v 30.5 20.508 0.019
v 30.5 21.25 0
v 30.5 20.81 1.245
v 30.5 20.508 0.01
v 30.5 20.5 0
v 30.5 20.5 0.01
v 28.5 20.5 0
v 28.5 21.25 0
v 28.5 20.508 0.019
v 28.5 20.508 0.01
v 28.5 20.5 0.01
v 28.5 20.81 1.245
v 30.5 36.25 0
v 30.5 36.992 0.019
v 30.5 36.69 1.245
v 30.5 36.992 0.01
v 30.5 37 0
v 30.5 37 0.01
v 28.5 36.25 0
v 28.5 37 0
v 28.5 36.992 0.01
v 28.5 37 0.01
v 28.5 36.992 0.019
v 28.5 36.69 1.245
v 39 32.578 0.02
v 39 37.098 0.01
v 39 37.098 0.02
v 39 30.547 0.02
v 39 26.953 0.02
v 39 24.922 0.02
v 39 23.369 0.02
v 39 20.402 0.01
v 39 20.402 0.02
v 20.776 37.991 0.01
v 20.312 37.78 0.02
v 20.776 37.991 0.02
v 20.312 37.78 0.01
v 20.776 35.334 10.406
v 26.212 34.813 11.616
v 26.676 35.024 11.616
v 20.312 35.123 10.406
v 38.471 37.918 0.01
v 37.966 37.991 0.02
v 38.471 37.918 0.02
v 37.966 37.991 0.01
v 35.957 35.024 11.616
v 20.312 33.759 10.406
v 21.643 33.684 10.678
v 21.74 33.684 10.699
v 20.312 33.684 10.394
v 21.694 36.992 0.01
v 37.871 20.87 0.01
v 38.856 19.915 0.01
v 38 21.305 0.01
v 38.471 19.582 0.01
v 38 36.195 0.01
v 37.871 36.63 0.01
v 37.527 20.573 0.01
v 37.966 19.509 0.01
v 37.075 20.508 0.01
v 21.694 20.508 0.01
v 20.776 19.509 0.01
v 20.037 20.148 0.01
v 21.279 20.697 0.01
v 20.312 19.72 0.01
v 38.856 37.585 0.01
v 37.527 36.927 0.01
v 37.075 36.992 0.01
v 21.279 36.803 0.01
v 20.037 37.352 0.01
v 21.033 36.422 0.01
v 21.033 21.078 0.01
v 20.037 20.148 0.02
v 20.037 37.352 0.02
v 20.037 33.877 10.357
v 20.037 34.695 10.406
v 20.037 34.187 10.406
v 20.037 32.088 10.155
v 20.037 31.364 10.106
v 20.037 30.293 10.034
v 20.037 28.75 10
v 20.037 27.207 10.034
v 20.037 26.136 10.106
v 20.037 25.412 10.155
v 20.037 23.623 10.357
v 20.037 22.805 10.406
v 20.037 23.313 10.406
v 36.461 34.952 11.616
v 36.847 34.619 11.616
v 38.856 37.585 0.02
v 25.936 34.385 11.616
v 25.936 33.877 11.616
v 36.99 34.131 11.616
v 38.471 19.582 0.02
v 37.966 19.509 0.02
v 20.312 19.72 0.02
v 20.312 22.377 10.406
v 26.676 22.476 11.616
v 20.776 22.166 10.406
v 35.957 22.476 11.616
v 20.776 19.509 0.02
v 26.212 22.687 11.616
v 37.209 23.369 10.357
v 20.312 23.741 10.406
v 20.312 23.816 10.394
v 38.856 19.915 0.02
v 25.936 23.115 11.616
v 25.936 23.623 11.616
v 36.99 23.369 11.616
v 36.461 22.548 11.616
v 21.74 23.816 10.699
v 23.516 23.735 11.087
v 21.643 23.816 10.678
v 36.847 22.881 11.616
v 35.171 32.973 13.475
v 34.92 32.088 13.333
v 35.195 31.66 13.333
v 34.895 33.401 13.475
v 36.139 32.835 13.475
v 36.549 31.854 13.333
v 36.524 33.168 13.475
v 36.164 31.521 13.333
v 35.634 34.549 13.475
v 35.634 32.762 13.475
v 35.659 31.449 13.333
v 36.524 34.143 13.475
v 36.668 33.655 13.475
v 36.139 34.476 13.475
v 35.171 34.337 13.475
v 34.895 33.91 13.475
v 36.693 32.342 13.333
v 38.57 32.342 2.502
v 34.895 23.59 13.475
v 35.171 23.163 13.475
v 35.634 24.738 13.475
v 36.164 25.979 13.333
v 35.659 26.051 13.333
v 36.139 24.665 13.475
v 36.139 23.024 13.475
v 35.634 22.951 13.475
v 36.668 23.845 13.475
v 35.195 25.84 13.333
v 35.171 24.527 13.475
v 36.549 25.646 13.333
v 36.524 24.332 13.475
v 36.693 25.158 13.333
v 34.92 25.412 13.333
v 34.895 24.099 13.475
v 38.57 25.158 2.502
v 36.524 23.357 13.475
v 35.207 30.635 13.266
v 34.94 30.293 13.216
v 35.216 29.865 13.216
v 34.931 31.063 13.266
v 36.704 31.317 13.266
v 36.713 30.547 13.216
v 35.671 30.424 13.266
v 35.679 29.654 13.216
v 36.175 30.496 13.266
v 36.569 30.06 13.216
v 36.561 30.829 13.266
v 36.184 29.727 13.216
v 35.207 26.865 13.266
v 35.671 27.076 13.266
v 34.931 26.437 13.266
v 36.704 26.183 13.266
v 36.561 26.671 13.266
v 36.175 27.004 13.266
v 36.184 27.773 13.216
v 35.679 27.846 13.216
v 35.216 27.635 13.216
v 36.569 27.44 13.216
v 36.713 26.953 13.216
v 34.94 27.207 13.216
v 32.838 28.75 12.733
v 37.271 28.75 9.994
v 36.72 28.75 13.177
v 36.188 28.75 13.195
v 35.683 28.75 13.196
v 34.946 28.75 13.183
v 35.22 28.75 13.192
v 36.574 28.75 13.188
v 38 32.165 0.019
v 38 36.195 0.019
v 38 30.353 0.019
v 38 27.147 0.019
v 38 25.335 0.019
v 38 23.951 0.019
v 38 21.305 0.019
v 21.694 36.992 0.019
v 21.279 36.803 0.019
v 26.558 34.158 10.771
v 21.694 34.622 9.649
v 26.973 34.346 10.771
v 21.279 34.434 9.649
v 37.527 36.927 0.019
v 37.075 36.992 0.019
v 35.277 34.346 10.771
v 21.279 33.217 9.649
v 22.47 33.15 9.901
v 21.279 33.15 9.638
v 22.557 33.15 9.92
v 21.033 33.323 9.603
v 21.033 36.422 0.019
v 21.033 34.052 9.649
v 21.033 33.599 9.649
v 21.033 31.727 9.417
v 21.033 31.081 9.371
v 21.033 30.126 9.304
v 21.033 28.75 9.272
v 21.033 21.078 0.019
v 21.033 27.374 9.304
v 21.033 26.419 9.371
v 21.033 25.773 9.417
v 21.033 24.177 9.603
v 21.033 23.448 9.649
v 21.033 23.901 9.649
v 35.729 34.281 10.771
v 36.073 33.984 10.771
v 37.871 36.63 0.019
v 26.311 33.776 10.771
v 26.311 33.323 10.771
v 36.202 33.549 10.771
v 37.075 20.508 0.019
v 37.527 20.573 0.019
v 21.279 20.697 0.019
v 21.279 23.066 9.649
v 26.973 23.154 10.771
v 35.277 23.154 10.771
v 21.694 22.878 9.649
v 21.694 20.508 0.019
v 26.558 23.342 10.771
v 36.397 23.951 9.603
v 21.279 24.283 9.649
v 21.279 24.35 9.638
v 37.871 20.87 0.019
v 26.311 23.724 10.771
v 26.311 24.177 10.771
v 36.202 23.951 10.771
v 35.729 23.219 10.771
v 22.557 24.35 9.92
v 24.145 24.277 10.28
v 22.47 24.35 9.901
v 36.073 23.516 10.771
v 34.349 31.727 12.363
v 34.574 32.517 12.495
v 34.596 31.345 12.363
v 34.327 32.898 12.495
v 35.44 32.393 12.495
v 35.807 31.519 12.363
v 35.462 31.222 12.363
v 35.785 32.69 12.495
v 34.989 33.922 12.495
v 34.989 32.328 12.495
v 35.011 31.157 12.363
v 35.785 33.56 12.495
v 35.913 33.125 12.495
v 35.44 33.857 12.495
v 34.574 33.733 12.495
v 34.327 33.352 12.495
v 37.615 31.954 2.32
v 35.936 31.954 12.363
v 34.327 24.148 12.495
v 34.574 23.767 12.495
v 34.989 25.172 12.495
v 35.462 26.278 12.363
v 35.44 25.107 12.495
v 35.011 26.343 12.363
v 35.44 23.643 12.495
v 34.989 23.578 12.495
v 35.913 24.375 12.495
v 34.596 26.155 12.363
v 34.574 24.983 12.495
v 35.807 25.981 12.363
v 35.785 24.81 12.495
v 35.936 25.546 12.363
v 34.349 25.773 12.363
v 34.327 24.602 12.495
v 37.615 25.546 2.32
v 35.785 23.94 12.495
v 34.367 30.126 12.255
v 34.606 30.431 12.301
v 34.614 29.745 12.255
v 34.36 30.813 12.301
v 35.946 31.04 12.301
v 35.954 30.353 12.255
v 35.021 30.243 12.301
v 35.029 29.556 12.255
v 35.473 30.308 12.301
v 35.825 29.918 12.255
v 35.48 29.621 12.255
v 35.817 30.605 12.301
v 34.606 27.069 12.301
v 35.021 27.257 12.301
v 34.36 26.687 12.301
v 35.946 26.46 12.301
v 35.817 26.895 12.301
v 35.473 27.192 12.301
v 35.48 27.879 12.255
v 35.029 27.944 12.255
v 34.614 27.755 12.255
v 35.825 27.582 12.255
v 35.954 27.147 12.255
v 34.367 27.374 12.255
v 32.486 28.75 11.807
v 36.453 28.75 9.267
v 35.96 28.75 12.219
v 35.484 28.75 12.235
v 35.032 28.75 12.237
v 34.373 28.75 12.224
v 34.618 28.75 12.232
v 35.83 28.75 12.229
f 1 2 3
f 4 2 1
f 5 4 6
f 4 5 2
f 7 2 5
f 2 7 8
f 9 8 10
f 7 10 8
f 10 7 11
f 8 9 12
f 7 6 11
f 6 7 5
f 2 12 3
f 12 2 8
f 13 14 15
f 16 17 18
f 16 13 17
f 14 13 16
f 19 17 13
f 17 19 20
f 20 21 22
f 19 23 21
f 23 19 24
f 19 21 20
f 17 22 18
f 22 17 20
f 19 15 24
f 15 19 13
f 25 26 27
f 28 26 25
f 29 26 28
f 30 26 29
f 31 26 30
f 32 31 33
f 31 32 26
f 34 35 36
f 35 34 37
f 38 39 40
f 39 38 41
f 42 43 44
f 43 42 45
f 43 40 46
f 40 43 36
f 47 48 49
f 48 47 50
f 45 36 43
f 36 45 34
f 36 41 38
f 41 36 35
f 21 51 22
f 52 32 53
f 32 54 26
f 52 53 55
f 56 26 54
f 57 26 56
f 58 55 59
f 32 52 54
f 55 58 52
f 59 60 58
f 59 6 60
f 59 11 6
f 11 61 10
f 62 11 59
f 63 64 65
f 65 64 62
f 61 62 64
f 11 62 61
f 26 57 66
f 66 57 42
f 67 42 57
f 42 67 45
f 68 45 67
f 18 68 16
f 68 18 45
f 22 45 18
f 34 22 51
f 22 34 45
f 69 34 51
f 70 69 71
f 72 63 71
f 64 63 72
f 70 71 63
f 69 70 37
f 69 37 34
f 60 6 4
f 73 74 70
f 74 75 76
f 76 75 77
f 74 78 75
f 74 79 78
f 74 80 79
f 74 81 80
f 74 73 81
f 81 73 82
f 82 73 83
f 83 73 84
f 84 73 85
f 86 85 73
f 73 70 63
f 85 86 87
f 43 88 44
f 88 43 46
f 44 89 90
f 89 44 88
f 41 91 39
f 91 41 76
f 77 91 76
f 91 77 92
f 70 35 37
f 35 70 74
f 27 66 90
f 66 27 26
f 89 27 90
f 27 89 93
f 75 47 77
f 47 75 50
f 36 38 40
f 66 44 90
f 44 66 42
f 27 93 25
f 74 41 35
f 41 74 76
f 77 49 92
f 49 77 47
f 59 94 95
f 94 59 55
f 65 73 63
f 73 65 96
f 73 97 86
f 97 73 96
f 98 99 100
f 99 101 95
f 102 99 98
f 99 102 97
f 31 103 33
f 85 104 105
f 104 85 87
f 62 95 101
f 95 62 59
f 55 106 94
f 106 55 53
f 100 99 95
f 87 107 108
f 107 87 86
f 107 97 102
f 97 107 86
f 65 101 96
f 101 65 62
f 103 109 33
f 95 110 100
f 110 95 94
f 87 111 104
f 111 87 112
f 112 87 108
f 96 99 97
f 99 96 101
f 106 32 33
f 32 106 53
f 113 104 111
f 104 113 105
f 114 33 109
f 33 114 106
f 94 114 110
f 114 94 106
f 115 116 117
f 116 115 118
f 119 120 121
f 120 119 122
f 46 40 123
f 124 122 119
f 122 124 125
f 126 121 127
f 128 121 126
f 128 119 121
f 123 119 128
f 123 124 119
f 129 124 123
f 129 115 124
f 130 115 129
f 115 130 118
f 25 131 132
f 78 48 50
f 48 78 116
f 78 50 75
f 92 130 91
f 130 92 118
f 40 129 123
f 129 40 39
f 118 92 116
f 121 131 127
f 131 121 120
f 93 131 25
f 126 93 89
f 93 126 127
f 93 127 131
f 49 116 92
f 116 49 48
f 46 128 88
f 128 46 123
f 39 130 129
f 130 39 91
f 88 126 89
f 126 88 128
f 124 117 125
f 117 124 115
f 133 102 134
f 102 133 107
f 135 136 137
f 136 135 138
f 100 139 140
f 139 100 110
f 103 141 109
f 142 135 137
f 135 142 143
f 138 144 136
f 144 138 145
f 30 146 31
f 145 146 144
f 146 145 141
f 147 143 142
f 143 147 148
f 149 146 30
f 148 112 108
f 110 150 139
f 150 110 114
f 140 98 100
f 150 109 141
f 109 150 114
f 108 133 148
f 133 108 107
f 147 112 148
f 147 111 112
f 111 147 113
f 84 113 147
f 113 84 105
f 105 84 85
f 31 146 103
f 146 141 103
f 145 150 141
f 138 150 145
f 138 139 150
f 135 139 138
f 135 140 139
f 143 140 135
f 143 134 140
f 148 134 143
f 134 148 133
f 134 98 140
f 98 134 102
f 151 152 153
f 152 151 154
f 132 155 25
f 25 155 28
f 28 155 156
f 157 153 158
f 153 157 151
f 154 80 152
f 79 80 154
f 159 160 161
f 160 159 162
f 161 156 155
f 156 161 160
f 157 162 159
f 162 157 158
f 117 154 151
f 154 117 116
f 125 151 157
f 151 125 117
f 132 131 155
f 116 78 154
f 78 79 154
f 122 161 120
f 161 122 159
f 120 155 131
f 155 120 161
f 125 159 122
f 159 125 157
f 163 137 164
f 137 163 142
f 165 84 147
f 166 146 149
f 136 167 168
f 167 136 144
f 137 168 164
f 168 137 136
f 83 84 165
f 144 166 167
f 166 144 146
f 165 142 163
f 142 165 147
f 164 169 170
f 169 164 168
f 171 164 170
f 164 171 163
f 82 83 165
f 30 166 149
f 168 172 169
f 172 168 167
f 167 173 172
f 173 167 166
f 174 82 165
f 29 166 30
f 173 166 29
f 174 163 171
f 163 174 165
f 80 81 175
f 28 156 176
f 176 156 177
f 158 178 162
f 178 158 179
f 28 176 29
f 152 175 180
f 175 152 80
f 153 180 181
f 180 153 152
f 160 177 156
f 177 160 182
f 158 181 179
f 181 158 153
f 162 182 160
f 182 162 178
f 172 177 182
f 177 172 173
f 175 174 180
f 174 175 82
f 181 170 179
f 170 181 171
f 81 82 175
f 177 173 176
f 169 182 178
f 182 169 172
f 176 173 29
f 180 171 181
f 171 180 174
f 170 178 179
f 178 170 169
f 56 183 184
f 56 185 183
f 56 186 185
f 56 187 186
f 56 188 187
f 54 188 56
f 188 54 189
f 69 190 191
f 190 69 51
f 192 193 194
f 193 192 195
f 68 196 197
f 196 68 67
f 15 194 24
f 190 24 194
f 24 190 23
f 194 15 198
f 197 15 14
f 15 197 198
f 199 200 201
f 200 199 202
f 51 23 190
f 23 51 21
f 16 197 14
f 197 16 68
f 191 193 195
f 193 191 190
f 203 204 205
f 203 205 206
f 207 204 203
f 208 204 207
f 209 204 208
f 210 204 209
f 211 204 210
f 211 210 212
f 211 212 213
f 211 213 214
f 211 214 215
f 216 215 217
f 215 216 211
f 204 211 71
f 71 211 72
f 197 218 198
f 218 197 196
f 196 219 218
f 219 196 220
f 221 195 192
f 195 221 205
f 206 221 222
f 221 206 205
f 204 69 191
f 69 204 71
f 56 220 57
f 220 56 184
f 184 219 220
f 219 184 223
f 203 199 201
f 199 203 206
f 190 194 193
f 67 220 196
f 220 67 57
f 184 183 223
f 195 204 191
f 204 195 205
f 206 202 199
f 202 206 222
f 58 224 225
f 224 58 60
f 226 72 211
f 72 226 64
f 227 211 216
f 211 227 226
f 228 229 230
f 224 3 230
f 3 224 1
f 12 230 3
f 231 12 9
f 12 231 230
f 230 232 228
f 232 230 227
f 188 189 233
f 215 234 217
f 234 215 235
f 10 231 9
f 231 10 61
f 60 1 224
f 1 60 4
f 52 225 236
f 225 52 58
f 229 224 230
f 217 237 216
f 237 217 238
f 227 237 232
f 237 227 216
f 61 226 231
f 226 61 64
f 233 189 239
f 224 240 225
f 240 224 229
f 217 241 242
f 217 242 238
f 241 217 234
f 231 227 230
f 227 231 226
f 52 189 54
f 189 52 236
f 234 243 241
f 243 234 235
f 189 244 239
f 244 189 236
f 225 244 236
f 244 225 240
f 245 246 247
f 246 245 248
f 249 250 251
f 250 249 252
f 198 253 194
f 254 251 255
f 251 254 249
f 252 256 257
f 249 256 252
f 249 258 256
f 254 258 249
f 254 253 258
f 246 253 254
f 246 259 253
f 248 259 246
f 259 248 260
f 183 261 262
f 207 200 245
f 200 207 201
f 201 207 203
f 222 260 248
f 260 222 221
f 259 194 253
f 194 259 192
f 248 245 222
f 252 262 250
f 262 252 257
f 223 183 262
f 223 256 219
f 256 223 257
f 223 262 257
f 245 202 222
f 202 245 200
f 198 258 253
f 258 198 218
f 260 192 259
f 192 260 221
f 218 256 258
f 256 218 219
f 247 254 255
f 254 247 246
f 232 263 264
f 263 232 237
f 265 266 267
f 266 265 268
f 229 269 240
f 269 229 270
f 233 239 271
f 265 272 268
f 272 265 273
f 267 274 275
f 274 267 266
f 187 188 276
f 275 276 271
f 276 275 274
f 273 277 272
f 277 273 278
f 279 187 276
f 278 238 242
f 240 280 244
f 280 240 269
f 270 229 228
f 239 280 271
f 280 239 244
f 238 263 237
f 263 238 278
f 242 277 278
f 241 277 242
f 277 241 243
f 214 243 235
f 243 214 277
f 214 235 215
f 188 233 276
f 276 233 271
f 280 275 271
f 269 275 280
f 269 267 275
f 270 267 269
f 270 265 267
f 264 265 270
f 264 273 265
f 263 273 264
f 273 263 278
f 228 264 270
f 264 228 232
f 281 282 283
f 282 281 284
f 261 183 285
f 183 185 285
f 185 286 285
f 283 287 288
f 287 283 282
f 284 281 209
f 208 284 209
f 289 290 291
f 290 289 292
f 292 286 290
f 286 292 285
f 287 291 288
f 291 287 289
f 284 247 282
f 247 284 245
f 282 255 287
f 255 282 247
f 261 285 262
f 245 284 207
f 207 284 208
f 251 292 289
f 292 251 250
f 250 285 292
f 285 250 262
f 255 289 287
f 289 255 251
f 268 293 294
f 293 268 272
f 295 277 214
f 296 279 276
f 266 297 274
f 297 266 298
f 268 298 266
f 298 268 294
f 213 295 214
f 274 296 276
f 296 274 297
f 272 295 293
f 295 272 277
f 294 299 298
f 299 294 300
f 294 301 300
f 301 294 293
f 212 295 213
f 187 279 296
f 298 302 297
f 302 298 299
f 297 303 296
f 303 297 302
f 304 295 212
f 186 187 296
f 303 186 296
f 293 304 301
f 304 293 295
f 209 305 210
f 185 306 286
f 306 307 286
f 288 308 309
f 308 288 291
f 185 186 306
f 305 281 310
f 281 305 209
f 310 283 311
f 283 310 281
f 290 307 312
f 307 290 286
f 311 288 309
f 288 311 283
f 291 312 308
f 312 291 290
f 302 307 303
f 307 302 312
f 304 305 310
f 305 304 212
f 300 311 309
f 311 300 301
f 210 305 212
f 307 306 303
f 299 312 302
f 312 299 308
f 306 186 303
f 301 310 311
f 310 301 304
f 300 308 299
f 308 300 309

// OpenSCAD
//measures are in millimeters
// Support not needed
// 210°   hotend
// 70°    bed
// 0.1    resolution
// 20mm/s speed
// 100%   infill
// Geeetech PLA
AY=18.5;
AX=19.0;
BY=12.5;
BLX=14.5;
EZ=11.0;
FLZ=14.0;
H=13.75;    //we need 1mm more
CYL_OFF_Z=50;
CYL_DEPTH=0.1;
CLIP_X=2;
CLIP_Y=0.75;
CLIP_H=3*CLIP_Y;
CORNER_RADIUS=1;    // we don't want 

WallThickness=1.00;
ClipWidth=2.2;
ClipDepth=1.0;

//ascfront=FLZ/sqrt(pow(FLZ,2)-pow(H,2));
//asctop=(H-EZ)/sqrt(pow(BLX,2)-pow((H-EZ),2));

alpha=asin((H-EZ)/BLX);
beta=asin(H/FLZ);
gamma=90-asin((0.5*(AY-BY))/EZ);

module keycap(){
	scale([AX/(AX+2*CORNER_RADIUS),AY/(AY+2*CORNER_RADIUS),1])
	translate([CORNER_RADIUS,CORNER_RADIUS,0.01])
	minkowski(){
		difference(){
			cube([AX,AY,H]);
			rotate(a=gamma,v=[1,0,0]) cube([100,100,100]);
			translate([0,AY,0]) rotate(a=90-gamma,v=[1,0,0]) cube([100,100,100]);
			translate([0,0,EZ]) rotate(a=-alpha,v=[0,1,0]) translate([-50,0,0]) cube([100,100,100]);
			translate([0,AY/2,EZ+CYL_OFF_Z]) rotate(a=90-alpha,v=[0,1,0]) cylinder(h=100,center=true,r=CYL_OFF_Z+CYL_DEPTH,$fa=1);
			translate([AX,0,0]) rotate(a=beta-90,v=[0,1,0]) cube([100,100,100]);
		}
		cylinder(h=0.01,r=CORNER_RADIUS,$fs=0.6);
		//rotate(a=90,v=[1,0,0]) cylinder(h=0.01,r=1,$fs=0.6);
	}
}

module clip(){
	difference(){
		cube([CLIP_X,CLIP_Y,CLIP_H]);
		translate([0,CLIP_Y,0]) rotate(a=asin(CLIP_Y/CLIP_H),v=[1,0,0]) cube([100,100,100]);
	}
}

i=1;
j=1;
translate([i*(AX+WallThickness),j*(AY+WallThickness),0]){

translate([(AX-CLIP_X)/2,WallThickness,0]) clip();
translate([0,AY,0]) mirror([0,1,0]) translate([(AX-CLIP_X)/2,WallThickness,0]) clip();

difference(){
	keycap();
	translate([WallThickness, WallThickness, 0]) scale(v=[1-2*WallThickness/AX, 1-2*WallThickness/AY, 1-WallThickness/H]) keycap();
}
}
